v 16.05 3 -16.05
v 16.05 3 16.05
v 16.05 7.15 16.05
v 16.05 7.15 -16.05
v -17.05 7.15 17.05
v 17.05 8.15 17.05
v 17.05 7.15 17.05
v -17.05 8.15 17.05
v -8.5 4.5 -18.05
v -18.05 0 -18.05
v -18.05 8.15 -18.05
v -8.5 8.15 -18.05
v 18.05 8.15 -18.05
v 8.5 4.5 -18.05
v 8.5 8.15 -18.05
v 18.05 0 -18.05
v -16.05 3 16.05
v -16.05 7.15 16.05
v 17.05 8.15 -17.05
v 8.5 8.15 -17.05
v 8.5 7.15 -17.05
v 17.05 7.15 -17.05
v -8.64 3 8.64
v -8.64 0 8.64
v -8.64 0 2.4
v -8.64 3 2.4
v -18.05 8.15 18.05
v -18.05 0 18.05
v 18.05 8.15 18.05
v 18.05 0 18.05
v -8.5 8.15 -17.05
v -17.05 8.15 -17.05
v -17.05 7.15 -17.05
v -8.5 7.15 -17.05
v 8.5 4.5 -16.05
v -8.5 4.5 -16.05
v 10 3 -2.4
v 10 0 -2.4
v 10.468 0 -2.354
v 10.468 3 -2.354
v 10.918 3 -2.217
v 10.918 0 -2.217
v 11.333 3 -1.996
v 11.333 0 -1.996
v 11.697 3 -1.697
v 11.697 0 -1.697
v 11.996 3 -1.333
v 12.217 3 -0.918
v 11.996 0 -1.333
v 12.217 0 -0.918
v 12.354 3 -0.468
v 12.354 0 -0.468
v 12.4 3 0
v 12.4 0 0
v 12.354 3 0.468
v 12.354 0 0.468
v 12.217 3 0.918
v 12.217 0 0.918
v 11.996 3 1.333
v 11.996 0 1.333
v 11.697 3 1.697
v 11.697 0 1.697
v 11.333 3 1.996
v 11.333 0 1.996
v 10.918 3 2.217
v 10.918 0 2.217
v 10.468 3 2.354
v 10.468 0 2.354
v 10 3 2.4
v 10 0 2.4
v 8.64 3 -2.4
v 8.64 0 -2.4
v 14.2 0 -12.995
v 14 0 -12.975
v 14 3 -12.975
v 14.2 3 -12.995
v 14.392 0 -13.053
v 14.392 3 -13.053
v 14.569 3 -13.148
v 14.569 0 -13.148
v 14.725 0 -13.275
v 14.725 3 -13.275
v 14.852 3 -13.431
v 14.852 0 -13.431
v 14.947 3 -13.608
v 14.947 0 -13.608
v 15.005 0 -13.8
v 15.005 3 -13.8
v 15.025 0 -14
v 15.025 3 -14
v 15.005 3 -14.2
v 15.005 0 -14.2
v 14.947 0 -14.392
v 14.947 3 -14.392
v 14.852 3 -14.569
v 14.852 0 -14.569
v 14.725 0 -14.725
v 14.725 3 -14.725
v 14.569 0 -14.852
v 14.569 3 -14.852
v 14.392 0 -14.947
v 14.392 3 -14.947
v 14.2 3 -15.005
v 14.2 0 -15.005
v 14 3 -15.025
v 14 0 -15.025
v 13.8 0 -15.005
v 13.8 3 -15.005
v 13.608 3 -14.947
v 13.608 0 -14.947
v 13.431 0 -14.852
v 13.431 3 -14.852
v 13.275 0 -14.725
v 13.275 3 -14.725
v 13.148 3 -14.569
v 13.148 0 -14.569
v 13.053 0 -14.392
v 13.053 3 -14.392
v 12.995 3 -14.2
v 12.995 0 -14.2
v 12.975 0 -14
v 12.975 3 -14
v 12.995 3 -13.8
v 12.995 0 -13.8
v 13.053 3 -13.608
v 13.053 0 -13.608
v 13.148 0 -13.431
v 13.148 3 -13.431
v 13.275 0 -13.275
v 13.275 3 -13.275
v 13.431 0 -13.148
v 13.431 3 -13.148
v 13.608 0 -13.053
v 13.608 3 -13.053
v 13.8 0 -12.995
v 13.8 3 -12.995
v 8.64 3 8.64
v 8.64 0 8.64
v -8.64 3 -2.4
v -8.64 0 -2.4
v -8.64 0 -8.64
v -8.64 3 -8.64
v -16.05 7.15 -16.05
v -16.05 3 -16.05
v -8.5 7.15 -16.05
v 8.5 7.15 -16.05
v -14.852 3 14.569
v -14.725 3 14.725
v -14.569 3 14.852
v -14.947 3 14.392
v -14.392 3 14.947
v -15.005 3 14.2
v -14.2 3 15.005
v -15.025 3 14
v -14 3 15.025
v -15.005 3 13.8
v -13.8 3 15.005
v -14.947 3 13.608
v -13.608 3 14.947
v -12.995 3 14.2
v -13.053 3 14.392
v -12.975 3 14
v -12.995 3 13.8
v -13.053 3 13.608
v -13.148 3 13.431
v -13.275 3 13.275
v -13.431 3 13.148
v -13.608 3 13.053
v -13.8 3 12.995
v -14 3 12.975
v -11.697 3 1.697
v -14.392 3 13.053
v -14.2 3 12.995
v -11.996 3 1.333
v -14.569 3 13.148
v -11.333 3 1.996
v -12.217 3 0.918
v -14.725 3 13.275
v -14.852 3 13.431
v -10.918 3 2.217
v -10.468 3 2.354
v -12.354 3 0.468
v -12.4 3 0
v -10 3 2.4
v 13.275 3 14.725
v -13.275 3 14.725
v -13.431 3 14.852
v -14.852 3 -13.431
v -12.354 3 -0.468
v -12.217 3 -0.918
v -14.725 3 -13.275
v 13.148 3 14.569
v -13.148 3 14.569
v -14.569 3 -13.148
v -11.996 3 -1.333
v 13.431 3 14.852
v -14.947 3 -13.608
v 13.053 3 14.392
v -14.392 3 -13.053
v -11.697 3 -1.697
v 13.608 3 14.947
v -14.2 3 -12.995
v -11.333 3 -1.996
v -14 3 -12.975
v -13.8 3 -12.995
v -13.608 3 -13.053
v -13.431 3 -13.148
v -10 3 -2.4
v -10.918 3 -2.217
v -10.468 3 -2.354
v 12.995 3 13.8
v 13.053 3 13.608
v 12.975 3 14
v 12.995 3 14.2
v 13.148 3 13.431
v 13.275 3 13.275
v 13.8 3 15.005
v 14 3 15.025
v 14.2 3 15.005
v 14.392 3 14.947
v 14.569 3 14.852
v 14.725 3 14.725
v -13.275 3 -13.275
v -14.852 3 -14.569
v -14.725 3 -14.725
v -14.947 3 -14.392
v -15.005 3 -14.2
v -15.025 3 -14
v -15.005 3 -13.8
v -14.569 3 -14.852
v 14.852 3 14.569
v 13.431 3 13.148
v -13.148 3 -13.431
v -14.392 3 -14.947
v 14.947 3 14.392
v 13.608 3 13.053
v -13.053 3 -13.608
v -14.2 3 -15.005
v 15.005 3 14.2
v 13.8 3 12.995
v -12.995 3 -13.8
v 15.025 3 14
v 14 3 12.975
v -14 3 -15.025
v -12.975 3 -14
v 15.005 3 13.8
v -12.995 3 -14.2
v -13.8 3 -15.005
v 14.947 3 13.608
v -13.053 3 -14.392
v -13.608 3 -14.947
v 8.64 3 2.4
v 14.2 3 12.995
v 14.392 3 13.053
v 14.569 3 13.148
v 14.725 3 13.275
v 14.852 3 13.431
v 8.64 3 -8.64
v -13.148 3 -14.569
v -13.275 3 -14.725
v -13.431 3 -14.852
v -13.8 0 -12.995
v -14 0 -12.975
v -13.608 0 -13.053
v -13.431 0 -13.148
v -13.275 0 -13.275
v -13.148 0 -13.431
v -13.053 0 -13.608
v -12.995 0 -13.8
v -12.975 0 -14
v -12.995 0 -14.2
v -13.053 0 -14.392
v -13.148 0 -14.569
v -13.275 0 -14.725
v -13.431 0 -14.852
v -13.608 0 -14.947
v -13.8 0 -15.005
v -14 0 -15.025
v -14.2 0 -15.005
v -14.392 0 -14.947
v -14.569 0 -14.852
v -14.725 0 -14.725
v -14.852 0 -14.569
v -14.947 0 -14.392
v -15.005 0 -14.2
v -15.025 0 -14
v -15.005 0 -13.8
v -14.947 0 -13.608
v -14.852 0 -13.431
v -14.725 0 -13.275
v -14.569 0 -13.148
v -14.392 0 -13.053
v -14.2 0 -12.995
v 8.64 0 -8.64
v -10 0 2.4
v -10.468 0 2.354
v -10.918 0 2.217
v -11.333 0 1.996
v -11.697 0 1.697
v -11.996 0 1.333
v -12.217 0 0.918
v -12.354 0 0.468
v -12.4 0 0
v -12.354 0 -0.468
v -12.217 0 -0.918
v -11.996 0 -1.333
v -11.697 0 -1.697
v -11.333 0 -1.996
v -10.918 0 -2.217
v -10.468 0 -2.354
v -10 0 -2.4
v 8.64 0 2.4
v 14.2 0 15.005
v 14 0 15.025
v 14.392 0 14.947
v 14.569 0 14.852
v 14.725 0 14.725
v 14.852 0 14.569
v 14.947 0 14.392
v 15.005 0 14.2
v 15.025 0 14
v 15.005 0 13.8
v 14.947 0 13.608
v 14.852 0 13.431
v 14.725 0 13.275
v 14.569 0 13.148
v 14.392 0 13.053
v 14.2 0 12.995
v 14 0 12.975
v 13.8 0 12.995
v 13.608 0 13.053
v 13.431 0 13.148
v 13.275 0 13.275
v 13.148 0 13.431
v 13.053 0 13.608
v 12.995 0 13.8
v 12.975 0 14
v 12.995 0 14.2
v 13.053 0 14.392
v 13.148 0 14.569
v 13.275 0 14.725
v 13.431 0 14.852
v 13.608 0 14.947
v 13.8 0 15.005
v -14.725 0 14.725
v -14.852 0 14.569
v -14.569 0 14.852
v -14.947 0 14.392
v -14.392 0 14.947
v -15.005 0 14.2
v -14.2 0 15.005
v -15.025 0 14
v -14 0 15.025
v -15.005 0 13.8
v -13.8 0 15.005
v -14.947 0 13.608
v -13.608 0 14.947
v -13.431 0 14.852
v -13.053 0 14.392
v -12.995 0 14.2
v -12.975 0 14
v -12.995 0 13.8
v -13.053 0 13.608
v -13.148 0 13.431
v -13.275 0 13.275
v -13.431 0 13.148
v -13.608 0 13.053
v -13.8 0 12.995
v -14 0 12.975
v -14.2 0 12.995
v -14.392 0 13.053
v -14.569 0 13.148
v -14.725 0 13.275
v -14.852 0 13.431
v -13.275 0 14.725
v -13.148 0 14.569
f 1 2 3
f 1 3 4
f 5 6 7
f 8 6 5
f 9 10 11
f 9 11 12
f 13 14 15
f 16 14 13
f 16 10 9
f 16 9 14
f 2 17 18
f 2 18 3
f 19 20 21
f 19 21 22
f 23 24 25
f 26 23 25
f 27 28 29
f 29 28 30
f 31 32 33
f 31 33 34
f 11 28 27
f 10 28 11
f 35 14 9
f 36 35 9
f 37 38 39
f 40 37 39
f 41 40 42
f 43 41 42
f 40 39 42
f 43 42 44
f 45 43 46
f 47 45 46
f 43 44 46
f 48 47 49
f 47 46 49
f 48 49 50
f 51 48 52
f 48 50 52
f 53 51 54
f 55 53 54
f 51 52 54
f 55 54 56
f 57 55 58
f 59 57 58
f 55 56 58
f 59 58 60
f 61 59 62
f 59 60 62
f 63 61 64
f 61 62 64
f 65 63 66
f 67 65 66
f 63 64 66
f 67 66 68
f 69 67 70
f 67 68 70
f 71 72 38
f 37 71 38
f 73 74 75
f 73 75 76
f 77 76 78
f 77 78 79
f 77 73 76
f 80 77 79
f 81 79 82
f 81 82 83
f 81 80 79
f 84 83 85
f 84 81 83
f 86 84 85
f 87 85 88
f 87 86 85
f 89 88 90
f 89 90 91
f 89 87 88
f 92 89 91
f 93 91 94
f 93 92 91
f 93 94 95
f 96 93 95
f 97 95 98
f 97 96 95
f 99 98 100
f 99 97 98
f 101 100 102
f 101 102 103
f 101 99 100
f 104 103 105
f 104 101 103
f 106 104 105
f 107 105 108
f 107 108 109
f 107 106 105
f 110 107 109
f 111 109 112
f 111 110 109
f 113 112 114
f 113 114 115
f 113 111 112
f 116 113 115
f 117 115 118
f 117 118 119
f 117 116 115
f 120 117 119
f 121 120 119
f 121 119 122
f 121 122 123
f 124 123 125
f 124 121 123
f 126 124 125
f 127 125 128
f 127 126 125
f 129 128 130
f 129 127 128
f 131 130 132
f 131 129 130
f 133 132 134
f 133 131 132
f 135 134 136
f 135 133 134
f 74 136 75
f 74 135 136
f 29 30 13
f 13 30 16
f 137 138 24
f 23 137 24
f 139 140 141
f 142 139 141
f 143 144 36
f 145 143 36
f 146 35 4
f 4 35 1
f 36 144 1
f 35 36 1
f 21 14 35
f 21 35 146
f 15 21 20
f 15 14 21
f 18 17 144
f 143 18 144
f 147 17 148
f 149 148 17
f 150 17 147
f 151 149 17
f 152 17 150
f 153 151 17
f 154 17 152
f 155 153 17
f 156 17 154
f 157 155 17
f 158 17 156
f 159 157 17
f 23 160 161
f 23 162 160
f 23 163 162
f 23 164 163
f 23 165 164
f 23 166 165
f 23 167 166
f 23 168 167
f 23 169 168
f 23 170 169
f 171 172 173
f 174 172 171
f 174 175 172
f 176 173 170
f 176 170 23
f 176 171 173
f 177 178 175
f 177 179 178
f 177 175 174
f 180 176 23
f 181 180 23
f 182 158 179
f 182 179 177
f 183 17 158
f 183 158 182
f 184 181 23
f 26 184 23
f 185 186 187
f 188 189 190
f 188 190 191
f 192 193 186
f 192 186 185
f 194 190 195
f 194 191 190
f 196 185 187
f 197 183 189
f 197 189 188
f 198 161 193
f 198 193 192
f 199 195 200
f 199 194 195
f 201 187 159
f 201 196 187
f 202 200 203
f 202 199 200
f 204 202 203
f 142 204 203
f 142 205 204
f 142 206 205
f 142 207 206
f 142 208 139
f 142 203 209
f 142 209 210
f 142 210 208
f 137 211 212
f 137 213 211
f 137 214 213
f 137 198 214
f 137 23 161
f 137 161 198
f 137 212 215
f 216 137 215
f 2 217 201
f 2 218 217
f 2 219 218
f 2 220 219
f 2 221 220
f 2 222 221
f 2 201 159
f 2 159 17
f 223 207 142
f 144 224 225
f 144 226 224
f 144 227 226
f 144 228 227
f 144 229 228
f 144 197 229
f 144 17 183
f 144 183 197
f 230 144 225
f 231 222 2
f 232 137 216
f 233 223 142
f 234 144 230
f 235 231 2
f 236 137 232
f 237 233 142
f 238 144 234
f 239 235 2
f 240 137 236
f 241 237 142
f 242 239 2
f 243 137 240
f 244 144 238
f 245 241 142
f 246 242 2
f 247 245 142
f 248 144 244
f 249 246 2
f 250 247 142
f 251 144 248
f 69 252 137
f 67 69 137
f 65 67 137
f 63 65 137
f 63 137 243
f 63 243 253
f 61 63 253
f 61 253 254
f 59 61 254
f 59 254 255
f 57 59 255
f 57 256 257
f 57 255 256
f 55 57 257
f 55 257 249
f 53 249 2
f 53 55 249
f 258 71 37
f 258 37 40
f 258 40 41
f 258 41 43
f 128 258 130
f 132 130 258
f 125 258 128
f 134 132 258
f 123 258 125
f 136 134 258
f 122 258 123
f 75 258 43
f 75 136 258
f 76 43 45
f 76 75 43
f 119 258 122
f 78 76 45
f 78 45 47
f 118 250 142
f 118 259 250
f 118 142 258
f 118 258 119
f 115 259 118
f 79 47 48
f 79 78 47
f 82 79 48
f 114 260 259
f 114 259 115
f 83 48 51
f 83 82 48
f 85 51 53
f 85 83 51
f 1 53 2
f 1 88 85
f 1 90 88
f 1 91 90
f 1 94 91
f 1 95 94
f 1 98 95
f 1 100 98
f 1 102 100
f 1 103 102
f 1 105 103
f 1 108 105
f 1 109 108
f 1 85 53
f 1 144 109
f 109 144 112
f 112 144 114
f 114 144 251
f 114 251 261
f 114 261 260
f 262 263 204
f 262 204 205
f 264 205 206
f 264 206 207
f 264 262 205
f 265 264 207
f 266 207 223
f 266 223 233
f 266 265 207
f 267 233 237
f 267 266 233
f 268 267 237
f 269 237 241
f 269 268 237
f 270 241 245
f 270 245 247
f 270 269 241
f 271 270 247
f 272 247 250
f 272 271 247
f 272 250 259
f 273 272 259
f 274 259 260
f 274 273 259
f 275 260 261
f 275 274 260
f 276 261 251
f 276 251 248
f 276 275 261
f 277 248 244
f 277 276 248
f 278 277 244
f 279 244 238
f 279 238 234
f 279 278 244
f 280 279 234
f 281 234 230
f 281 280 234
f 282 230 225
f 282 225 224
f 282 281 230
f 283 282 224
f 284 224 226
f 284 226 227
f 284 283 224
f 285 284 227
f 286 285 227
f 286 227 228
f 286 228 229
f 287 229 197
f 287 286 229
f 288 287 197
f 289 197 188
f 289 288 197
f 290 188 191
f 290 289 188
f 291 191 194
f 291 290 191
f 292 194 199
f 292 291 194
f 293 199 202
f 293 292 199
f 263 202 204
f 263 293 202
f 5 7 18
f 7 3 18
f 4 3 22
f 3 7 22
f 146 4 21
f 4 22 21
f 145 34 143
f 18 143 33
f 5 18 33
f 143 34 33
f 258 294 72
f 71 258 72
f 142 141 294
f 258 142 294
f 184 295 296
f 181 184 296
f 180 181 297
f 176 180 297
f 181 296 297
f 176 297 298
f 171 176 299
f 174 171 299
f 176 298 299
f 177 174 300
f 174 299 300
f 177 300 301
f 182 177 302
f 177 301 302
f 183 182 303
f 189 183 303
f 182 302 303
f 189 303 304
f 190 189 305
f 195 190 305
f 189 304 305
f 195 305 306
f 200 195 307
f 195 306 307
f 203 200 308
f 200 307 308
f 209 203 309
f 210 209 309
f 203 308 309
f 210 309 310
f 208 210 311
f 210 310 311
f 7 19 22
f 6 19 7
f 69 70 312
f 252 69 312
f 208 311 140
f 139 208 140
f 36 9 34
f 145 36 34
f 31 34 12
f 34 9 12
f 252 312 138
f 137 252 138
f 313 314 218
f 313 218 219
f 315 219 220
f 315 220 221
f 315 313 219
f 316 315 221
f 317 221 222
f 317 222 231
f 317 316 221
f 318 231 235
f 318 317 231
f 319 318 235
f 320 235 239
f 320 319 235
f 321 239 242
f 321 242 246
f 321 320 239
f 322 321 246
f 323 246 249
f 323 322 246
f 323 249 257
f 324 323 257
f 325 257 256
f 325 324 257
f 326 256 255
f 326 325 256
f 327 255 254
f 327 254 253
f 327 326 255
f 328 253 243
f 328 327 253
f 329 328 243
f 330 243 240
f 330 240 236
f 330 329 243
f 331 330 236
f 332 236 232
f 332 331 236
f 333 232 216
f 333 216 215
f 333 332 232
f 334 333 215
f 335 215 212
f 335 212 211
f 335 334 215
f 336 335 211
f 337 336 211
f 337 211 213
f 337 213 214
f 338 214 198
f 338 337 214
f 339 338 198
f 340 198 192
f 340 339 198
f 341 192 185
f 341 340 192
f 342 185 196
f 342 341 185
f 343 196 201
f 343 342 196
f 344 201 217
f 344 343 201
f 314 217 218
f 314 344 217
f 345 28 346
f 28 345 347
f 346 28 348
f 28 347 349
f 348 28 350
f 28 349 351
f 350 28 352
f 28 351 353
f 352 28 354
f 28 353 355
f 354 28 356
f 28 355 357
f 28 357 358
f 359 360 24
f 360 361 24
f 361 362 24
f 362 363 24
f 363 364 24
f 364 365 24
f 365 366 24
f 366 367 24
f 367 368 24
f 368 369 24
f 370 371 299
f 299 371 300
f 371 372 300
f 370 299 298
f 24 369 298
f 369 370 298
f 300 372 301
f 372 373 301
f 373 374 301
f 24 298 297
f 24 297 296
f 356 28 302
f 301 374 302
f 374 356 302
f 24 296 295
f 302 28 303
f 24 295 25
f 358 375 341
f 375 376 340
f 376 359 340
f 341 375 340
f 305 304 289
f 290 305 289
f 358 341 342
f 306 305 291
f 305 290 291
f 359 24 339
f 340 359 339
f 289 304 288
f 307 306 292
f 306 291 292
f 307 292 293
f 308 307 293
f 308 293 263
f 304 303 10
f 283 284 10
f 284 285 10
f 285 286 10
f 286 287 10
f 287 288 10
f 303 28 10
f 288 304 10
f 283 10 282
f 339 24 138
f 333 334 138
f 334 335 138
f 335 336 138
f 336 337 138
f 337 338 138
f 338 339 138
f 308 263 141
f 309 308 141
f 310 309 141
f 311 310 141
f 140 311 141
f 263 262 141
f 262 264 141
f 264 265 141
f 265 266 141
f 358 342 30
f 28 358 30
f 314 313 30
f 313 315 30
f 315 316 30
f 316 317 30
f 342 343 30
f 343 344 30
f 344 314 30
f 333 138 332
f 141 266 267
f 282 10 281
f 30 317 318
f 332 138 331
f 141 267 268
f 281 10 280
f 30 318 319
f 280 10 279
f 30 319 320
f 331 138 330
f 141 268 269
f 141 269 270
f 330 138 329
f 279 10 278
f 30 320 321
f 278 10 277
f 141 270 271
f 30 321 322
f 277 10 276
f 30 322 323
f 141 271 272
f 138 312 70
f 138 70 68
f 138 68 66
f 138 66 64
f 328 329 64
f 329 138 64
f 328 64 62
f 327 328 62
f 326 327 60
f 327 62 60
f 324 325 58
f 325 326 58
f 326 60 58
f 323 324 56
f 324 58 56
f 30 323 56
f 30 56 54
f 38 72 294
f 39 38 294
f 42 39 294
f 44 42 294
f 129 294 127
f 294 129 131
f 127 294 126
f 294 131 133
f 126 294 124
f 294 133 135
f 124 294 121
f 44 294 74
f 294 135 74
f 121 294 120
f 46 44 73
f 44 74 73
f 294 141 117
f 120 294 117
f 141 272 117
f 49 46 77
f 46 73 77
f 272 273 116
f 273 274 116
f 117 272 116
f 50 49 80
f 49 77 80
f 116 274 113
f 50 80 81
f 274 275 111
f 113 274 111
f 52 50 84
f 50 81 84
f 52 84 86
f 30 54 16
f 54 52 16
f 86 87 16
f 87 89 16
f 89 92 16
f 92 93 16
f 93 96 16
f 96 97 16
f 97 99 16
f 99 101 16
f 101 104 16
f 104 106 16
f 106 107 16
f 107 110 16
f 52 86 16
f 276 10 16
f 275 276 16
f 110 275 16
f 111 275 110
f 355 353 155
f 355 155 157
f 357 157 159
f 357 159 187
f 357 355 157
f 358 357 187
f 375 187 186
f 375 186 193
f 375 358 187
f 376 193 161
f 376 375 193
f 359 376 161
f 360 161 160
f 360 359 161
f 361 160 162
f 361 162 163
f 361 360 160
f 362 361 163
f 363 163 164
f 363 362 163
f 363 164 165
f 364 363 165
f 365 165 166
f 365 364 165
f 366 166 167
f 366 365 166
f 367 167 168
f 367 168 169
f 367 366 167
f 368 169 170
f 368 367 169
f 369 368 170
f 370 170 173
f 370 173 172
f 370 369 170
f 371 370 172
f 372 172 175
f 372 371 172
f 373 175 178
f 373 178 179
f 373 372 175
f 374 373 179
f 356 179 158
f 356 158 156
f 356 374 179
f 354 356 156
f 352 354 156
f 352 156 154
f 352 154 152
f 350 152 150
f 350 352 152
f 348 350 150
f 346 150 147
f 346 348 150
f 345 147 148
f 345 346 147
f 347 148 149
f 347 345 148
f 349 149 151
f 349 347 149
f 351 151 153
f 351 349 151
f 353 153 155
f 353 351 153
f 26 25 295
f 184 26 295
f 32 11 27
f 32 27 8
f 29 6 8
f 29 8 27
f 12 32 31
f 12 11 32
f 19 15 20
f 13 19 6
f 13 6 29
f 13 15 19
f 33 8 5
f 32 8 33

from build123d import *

# Parameters (mm, degrees)
SKETCH1_W           = 36.1
SKETCH1_H           = 36.1
SKETCH1_R           = 1.025
BOSS_EXTRUDE1_DEPTH = 3
SKETCH1_3_W         = 36.1
SKETCH1_3_H         = 36.1
SKETCH1_3_W_2       = 32.1
SKETCH1_3_H_2       = 32.1
BOSS_EXTRUDE2_DEPTH = 8.15
SKETCH2_W           = 17
SKETCH2_H           = 3.65
CUT_EXTRUDE1_DEPTH  = 6
CUT_EXTRUDE2_DEPTH  = 1


with BuildPart() as part:
    # Sketch1 → Boss-Extrude1 (new body)
    with BuildSketch(Plane(origin=(0, 0, 0), x_dir=(1, 0, 0), z_dir=(0, 1, 0))):
        Rectangle(SKETCH1_W, SKETCH1_H)
        with Locations((-14, -14)):
            Circle(SKETCH1_R, mode=Mode.SUBTRACT)
        with Locations((14, -14)):
            Circle(SKETCH1_R, mode=Mode.SUBTRACT)
        with BuildLine():
            Line((-10, 2.4), (-8.64, 2.4))
            Line((-8.64, 2.4), (-8.64, 8.64))
            Line((-8.64, 8.64), (8.64, 8.64))
            Line((8.64, 8.64), (8.64, 2.4))
            Line((8.64, 2.4), (10, 2.4))
            ThreePointArc((10, 2.4), (12.4, 0), (10, -2.4))
            Line((10, -2.4), (8.64, -2.4))
            Line((8.64, -2.4), (8.64, -8.64))
            Line((8.64, -8.64), (-8.64, -8.64))
            Line((-8.64, -8.64), (-8.64, -2.4))
            Line((-8.64, -2.4), (-10, -2.4))
            ThreePointArc((-10, -2.4), (-12.4, 0), (-10, 2.4))
        make_face(mode=Mode.SUBTRACT)
        with Locations((-14, 14)):
            Circle(SKETCH1_R, mode=Mode.SUBTRACT)
        with Locations((14, 14)):
            Circle(SKETCH1_R, mode=Mode.SUBTRACT)
    extrude(amount=BOSS_EXTRUDE1_DEPTH)

    # Sketch1<3> → Boss-Extrude2 (add)
    with BuildSketch(Plane(origin=(0, 0, 0), x_dir=(1, 0, 0), z_dir=(0, 1, 0))):
        Rectangle(SKETCH1_3_W, SKETCH1_3_H)
        Rectangle(SKETCH1_3_W_2, SKETCH1_3_H_2, mode=Mode.SUBTRACT)
    extrude(amount=BOSS_EXTRUDE2_DEPTH)

    # Sketch2 → Cut-Extrude1 (cut)
    with BuildSketch(Plane(origin=(0, 0, -18.05), x_dir=(-1, 0, 0), z_dir=(0, 0, -1))):
        with Locations((0, 6.325)):
            Rectangle(SKETCH2_W, SKETCH2_H)
    extrude(amount=-CUT_EXTRUDE1_DEPTH, mode=Mode.SUBTRACT)

    # Sketch4 → Cut-Extrude2 (cut)
    with BuildSketch(Plane(origin=(0, 8.15, 0), x_dir=(1, 0, 0), z_dir=(0, 1, 0))):
        Polygon((17.05, -17.05), (-17.05, -17.05), (-17.05, 17.05), (-8.5, 17.05), (-8.5, 16.05), (-16.05, 16.05), (-16.05, -16.05), (16.05, -16.05), (16.05, 16.05), (8.5, 16.05), (8.5, 17.05), (17.05, 17.05), align=None)
    extrude(amount=-CUT_EXTRUDE2_DEPTH, mode=Mode.SUBTRACT)


solid = part.part
